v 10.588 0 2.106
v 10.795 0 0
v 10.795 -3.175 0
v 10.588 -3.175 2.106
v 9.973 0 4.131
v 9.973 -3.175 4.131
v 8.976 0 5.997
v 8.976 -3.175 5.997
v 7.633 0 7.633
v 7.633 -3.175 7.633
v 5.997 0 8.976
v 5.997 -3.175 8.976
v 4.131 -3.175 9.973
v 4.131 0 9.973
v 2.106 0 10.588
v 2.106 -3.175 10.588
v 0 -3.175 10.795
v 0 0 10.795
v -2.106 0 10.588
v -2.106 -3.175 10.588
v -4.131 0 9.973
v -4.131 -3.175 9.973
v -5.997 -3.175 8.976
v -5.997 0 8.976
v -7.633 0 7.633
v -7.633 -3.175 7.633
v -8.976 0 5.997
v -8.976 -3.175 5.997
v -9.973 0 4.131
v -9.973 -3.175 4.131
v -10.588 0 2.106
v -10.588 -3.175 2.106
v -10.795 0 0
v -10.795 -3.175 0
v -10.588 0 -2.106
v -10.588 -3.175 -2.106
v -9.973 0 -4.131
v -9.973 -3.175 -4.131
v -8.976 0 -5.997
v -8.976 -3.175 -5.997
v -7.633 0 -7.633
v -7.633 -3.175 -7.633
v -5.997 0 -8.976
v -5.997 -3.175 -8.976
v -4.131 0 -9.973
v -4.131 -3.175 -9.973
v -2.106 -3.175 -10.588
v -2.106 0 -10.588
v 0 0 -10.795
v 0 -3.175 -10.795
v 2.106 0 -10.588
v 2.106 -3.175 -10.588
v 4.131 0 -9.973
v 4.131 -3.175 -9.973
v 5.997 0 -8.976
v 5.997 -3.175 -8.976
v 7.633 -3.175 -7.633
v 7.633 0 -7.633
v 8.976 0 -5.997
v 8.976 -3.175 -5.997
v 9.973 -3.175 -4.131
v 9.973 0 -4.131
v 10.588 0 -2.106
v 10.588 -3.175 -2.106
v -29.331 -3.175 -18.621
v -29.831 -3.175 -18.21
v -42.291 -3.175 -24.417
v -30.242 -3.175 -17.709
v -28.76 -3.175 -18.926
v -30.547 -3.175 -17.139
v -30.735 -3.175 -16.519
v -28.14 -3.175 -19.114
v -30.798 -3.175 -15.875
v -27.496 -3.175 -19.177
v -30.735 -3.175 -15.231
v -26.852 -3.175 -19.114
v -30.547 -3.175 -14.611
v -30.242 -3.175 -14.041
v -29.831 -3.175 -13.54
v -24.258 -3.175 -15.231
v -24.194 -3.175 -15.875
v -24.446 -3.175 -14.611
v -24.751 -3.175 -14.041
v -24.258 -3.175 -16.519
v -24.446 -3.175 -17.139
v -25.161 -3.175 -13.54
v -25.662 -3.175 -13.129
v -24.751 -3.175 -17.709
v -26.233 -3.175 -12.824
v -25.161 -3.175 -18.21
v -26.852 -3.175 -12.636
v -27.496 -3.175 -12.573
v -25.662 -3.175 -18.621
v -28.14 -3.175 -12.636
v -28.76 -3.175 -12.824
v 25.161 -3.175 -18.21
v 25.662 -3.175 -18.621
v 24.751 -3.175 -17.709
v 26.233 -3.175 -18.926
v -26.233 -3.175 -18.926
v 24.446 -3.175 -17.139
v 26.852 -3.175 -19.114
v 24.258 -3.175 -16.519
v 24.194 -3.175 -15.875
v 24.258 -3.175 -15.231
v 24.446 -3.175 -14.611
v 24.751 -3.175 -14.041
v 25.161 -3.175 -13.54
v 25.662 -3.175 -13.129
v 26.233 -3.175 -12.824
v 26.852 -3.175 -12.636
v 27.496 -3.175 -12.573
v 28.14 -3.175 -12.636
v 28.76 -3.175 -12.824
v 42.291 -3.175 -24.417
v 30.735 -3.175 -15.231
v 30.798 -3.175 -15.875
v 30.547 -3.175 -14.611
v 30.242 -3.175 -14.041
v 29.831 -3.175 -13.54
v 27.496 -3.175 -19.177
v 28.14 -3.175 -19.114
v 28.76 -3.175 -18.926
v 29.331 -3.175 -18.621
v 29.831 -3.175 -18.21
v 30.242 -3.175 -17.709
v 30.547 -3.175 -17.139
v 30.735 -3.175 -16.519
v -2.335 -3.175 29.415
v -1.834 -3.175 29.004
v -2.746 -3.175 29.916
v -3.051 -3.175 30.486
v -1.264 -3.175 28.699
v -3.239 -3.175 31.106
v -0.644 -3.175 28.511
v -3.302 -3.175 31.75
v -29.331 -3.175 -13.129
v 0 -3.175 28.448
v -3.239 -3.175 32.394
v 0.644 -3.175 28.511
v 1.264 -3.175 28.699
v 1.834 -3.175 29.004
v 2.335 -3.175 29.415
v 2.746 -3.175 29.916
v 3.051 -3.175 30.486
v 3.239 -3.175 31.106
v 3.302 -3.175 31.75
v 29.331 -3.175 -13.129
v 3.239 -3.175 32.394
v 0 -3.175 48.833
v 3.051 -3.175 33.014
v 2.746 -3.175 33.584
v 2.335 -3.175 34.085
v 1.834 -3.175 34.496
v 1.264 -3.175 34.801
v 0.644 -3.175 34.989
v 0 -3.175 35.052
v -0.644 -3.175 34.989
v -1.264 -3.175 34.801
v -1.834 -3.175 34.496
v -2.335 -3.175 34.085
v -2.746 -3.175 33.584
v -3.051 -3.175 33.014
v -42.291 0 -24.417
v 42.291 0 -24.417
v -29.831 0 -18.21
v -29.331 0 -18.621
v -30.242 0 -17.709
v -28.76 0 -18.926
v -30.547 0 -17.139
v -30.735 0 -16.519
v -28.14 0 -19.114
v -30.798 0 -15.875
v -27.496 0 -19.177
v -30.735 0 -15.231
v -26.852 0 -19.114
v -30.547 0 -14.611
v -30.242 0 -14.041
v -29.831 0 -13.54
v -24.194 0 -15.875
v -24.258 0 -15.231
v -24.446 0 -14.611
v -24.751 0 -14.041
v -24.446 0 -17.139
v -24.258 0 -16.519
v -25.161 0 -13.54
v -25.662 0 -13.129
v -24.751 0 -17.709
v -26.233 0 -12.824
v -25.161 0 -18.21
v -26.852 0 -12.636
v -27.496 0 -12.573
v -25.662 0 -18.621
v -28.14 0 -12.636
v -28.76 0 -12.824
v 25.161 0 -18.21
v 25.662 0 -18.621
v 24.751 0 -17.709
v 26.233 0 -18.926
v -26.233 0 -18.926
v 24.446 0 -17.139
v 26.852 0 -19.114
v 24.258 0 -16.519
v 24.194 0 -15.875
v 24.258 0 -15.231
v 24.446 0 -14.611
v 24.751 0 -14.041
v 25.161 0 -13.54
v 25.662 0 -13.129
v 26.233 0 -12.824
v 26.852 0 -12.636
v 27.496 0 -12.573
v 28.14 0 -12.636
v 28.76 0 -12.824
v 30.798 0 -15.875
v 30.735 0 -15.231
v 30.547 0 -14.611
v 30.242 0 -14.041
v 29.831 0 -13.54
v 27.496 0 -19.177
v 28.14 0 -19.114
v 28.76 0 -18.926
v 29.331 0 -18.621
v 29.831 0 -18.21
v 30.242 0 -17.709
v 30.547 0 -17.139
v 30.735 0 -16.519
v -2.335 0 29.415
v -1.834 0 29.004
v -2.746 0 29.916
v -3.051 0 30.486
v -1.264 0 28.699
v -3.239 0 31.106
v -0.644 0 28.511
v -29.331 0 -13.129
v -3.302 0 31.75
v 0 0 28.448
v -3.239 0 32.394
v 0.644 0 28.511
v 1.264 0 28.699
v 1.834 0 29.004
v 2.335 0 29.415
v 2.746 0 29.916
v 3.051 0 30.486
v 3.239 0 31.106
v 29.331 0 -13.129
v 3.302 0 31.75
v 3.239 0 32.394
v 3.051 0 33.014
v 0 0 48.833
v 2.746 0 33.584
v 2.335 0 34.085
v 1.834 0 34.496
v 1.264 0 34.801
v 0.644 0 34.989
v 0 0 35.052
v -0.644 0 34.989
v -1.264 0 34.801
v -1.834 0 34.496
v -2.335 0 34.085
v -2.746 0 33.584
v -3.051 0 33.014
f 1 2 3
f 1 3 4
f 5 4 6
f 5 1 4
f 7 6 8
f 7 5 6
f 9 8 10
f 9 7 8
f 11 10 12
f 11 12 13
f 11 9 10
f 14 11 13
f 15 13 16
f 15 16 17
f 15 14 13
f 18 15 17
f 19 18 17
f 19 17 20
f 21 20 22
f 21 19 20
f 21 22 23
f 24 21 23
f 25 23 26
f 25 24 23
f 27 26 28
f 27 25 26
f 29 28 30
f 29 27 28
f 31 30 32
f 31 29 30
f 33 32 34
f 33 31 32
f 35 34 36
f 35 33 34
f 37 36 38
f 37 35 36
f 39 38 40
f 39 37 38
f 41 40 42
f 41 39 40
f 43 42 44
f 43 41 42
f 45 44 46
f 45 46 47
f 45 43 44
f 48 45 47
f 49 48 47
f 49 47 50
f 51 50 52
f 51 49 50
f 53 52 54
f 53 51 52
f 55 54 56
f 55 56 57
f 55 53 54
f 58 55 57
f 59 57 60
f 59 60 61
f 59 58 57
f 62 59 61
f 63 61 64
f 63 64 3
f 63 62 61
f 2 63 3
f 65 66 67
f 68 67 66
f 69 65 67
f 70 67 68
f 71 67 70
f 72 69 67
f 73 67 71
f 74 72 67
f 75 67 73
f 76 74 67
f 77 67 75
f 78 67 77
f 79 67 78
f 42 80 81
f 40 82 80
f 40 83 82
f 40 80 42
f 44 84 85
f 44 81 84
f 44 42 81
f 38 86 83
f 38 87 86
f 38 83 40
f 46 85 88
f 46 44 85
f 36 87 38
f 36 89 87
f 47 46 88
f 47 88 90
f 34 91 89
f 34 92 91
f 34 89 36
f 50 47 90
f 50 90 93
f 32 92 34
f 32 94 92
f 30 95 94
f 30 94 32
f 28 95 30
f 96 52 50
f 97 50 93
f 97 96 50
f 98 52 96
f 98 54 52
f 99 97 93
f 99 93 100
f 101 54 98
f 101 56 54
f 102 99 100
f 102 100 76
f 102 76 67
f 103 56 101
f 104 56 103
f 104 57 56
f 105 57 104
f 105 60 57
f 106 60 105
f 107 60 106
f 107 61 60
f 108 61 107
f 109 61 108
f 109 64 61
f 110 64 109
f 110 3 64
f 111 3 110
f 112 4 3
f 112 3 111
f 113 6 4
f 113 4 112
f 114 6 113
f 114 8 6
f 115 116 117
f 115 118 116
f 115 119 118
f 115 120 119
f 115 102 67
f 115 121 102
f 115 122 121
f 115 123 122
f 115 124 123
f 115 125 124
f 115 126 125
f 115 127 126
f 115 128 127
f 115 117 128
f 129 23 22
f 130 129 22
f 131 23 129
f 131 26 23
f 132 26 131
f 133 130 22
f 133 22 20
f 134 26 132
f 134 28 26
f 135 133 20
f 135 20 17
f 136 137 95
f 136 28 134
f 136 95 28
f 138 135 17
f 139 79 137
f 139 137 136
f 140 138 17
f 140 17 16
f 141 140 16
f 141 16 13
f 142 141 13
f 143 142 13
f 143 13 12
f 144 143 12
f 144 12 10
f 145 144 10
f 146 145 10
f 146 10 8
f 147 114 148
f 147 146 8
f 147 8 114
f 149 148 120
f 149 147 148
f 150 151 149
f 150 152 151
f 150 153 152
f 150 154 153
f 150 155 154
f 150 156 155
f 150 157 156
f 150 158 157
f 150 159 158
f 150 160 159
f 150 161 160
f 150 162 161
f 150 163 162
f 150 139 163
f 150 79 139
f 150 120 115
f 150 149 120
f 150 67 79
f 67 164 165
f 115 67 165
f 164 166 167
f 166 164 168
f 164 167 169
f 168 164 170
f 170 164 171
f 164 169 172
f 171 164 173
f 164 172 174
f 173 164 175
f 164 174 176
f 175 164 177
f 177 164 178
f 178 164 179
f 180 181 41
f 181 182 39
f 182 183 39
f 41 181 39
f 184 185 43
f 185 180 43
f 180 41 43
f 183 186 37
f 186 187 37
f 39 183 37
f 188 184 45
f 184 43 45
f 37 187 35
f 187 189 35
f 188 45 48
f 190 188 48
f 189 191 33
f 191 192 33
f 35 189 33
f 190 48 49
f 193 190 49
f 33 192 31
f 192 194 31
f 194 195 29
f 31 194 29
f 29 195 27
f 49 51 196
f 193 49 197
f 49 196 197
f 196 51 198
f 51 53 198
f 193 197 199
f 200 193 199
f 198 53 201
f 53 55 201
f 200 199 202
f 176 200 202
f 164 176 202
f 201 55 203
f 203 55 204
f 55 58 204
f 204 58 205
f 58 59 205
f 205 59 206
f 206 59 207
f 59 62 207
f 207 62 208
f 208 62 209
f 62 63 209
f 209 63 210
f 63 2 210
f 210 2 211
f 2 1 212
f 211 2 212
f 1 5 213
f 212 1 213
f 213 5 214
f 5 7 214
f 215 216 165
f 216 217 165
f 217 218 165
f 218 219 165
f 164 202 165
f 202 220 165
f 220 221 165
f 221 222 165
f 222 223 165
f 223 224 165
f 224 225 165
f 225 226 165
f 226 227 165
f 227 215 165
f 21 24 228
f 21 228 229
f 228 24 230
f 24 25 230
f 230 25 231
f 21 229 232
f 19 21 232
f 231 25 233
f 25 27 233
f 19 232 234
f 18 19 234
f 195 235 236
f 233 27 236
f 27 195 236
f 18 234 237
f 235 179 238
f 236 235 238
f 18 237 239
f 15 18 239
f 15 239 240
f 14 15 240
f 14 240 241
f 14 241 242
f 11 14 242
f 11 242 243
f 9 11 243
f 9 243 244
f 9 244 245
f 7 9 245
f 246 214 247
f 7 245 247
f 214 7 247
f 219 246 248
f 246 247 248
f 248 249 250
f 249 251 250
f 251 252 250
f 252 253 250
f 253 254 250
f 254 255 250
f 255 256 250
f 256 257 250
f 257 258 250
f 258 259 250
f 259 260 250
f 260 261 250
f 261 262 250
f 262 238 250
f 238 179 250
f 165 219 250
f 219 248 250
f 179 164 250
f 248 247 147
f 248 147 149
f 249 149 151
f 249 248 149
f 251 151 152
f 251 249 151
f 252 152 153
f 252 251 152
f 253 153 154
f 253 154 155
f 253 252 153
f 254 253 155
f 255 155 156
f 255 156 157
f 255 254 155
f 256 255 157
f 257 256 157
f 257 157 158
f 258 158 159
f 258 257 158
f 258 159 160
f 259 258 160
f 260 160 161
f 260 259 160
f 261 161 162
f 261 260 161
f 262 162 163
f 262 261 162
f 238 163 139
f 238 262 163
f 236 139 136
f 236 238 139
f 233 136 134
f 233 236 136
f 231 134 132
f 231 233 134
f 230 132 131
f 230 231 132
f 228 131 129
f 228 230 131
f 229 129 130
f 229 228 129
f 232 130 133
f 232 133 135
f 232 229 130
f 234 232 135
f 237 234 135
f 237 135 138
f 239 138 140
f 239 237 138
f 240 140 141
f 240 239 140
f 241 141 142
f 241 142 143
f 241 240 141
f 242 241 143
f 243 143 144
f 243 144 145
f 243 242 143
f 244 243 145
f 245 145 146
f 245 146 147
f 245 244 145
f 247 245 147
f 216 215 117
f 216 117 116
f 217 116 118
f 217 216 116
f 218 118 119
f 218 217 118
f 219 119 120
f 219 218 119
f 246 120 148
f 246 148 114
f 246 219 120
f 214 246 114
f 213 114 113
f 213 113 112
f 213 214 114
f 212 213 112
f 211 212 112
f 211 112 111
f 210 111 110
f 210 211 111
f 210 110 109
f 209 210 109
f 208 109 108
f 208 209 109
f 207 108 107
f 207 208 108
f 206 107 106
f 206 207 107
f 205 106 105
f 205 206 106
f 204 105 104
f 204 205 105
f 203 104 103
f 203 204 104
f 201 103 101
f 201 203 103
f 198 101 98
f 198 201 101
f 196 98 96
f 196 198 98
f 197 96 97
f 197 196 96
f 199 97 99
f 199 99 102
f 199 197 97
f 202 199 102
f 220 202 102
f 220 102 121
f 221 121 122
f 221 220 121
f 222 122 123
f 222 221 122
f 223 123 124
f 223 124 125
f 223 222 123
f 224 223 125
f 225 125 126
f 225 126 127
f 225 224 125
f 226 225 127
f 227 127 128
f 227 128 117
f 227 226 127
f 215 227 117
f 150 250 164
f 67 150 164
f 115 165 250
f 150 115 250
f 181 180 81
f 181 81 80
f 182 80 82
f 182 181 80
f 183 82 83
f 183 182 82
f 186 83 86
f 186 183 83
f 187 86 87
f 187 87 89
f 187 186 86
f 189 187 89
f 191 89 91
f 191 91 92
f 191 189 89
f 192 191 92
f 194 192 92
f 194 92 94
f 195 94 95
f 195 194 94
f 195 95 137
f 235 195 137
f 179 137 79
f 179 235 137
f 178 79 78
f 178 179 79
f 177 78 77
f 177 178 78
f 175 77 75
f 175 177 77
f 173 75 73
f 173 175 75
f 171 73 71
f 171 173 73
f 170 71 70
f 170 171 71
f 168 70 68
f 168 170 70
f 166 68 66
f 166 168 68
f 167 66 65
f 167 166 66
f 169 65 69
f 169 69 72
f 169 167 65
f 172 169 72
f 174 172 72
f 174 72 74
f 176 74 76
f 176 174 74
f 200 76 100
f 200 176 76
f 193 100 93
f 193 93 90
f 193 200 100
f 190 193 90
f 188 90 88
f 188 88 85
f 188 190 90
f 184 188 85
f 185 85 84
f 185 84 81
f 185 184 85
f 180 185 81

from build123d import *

# Parameters (mm, degrees)
F0_R     = 3.302
F0_R_2   = 10.795
F1_DEPTH = 3.175


with BuildPart() as f1:
    # F0 (on Front) → F1 (new body)
    with BuildSketch(Plane.XZ):
        Polygon((42.291, -24.41672), (0, 48.83344), (-42.291, -24.41672), align=None)
        with Locations((-27.496307, -15.875)):
            Circle(F0_R, mode=Mode.SUBTRACT)
        with Locations((27.496307, -15.875)):
            Circle(F0_R, mode=Mode.SUBTRACT)
        Circle(F0_R_2, mode=Mode.SUBTRACT)
        with Locations((0, 31.75)):
            Circle(F0_R, mode=Mode.SUBTRACT)
    extrude(amount=F1_DEPTH)


solid = f1.part
